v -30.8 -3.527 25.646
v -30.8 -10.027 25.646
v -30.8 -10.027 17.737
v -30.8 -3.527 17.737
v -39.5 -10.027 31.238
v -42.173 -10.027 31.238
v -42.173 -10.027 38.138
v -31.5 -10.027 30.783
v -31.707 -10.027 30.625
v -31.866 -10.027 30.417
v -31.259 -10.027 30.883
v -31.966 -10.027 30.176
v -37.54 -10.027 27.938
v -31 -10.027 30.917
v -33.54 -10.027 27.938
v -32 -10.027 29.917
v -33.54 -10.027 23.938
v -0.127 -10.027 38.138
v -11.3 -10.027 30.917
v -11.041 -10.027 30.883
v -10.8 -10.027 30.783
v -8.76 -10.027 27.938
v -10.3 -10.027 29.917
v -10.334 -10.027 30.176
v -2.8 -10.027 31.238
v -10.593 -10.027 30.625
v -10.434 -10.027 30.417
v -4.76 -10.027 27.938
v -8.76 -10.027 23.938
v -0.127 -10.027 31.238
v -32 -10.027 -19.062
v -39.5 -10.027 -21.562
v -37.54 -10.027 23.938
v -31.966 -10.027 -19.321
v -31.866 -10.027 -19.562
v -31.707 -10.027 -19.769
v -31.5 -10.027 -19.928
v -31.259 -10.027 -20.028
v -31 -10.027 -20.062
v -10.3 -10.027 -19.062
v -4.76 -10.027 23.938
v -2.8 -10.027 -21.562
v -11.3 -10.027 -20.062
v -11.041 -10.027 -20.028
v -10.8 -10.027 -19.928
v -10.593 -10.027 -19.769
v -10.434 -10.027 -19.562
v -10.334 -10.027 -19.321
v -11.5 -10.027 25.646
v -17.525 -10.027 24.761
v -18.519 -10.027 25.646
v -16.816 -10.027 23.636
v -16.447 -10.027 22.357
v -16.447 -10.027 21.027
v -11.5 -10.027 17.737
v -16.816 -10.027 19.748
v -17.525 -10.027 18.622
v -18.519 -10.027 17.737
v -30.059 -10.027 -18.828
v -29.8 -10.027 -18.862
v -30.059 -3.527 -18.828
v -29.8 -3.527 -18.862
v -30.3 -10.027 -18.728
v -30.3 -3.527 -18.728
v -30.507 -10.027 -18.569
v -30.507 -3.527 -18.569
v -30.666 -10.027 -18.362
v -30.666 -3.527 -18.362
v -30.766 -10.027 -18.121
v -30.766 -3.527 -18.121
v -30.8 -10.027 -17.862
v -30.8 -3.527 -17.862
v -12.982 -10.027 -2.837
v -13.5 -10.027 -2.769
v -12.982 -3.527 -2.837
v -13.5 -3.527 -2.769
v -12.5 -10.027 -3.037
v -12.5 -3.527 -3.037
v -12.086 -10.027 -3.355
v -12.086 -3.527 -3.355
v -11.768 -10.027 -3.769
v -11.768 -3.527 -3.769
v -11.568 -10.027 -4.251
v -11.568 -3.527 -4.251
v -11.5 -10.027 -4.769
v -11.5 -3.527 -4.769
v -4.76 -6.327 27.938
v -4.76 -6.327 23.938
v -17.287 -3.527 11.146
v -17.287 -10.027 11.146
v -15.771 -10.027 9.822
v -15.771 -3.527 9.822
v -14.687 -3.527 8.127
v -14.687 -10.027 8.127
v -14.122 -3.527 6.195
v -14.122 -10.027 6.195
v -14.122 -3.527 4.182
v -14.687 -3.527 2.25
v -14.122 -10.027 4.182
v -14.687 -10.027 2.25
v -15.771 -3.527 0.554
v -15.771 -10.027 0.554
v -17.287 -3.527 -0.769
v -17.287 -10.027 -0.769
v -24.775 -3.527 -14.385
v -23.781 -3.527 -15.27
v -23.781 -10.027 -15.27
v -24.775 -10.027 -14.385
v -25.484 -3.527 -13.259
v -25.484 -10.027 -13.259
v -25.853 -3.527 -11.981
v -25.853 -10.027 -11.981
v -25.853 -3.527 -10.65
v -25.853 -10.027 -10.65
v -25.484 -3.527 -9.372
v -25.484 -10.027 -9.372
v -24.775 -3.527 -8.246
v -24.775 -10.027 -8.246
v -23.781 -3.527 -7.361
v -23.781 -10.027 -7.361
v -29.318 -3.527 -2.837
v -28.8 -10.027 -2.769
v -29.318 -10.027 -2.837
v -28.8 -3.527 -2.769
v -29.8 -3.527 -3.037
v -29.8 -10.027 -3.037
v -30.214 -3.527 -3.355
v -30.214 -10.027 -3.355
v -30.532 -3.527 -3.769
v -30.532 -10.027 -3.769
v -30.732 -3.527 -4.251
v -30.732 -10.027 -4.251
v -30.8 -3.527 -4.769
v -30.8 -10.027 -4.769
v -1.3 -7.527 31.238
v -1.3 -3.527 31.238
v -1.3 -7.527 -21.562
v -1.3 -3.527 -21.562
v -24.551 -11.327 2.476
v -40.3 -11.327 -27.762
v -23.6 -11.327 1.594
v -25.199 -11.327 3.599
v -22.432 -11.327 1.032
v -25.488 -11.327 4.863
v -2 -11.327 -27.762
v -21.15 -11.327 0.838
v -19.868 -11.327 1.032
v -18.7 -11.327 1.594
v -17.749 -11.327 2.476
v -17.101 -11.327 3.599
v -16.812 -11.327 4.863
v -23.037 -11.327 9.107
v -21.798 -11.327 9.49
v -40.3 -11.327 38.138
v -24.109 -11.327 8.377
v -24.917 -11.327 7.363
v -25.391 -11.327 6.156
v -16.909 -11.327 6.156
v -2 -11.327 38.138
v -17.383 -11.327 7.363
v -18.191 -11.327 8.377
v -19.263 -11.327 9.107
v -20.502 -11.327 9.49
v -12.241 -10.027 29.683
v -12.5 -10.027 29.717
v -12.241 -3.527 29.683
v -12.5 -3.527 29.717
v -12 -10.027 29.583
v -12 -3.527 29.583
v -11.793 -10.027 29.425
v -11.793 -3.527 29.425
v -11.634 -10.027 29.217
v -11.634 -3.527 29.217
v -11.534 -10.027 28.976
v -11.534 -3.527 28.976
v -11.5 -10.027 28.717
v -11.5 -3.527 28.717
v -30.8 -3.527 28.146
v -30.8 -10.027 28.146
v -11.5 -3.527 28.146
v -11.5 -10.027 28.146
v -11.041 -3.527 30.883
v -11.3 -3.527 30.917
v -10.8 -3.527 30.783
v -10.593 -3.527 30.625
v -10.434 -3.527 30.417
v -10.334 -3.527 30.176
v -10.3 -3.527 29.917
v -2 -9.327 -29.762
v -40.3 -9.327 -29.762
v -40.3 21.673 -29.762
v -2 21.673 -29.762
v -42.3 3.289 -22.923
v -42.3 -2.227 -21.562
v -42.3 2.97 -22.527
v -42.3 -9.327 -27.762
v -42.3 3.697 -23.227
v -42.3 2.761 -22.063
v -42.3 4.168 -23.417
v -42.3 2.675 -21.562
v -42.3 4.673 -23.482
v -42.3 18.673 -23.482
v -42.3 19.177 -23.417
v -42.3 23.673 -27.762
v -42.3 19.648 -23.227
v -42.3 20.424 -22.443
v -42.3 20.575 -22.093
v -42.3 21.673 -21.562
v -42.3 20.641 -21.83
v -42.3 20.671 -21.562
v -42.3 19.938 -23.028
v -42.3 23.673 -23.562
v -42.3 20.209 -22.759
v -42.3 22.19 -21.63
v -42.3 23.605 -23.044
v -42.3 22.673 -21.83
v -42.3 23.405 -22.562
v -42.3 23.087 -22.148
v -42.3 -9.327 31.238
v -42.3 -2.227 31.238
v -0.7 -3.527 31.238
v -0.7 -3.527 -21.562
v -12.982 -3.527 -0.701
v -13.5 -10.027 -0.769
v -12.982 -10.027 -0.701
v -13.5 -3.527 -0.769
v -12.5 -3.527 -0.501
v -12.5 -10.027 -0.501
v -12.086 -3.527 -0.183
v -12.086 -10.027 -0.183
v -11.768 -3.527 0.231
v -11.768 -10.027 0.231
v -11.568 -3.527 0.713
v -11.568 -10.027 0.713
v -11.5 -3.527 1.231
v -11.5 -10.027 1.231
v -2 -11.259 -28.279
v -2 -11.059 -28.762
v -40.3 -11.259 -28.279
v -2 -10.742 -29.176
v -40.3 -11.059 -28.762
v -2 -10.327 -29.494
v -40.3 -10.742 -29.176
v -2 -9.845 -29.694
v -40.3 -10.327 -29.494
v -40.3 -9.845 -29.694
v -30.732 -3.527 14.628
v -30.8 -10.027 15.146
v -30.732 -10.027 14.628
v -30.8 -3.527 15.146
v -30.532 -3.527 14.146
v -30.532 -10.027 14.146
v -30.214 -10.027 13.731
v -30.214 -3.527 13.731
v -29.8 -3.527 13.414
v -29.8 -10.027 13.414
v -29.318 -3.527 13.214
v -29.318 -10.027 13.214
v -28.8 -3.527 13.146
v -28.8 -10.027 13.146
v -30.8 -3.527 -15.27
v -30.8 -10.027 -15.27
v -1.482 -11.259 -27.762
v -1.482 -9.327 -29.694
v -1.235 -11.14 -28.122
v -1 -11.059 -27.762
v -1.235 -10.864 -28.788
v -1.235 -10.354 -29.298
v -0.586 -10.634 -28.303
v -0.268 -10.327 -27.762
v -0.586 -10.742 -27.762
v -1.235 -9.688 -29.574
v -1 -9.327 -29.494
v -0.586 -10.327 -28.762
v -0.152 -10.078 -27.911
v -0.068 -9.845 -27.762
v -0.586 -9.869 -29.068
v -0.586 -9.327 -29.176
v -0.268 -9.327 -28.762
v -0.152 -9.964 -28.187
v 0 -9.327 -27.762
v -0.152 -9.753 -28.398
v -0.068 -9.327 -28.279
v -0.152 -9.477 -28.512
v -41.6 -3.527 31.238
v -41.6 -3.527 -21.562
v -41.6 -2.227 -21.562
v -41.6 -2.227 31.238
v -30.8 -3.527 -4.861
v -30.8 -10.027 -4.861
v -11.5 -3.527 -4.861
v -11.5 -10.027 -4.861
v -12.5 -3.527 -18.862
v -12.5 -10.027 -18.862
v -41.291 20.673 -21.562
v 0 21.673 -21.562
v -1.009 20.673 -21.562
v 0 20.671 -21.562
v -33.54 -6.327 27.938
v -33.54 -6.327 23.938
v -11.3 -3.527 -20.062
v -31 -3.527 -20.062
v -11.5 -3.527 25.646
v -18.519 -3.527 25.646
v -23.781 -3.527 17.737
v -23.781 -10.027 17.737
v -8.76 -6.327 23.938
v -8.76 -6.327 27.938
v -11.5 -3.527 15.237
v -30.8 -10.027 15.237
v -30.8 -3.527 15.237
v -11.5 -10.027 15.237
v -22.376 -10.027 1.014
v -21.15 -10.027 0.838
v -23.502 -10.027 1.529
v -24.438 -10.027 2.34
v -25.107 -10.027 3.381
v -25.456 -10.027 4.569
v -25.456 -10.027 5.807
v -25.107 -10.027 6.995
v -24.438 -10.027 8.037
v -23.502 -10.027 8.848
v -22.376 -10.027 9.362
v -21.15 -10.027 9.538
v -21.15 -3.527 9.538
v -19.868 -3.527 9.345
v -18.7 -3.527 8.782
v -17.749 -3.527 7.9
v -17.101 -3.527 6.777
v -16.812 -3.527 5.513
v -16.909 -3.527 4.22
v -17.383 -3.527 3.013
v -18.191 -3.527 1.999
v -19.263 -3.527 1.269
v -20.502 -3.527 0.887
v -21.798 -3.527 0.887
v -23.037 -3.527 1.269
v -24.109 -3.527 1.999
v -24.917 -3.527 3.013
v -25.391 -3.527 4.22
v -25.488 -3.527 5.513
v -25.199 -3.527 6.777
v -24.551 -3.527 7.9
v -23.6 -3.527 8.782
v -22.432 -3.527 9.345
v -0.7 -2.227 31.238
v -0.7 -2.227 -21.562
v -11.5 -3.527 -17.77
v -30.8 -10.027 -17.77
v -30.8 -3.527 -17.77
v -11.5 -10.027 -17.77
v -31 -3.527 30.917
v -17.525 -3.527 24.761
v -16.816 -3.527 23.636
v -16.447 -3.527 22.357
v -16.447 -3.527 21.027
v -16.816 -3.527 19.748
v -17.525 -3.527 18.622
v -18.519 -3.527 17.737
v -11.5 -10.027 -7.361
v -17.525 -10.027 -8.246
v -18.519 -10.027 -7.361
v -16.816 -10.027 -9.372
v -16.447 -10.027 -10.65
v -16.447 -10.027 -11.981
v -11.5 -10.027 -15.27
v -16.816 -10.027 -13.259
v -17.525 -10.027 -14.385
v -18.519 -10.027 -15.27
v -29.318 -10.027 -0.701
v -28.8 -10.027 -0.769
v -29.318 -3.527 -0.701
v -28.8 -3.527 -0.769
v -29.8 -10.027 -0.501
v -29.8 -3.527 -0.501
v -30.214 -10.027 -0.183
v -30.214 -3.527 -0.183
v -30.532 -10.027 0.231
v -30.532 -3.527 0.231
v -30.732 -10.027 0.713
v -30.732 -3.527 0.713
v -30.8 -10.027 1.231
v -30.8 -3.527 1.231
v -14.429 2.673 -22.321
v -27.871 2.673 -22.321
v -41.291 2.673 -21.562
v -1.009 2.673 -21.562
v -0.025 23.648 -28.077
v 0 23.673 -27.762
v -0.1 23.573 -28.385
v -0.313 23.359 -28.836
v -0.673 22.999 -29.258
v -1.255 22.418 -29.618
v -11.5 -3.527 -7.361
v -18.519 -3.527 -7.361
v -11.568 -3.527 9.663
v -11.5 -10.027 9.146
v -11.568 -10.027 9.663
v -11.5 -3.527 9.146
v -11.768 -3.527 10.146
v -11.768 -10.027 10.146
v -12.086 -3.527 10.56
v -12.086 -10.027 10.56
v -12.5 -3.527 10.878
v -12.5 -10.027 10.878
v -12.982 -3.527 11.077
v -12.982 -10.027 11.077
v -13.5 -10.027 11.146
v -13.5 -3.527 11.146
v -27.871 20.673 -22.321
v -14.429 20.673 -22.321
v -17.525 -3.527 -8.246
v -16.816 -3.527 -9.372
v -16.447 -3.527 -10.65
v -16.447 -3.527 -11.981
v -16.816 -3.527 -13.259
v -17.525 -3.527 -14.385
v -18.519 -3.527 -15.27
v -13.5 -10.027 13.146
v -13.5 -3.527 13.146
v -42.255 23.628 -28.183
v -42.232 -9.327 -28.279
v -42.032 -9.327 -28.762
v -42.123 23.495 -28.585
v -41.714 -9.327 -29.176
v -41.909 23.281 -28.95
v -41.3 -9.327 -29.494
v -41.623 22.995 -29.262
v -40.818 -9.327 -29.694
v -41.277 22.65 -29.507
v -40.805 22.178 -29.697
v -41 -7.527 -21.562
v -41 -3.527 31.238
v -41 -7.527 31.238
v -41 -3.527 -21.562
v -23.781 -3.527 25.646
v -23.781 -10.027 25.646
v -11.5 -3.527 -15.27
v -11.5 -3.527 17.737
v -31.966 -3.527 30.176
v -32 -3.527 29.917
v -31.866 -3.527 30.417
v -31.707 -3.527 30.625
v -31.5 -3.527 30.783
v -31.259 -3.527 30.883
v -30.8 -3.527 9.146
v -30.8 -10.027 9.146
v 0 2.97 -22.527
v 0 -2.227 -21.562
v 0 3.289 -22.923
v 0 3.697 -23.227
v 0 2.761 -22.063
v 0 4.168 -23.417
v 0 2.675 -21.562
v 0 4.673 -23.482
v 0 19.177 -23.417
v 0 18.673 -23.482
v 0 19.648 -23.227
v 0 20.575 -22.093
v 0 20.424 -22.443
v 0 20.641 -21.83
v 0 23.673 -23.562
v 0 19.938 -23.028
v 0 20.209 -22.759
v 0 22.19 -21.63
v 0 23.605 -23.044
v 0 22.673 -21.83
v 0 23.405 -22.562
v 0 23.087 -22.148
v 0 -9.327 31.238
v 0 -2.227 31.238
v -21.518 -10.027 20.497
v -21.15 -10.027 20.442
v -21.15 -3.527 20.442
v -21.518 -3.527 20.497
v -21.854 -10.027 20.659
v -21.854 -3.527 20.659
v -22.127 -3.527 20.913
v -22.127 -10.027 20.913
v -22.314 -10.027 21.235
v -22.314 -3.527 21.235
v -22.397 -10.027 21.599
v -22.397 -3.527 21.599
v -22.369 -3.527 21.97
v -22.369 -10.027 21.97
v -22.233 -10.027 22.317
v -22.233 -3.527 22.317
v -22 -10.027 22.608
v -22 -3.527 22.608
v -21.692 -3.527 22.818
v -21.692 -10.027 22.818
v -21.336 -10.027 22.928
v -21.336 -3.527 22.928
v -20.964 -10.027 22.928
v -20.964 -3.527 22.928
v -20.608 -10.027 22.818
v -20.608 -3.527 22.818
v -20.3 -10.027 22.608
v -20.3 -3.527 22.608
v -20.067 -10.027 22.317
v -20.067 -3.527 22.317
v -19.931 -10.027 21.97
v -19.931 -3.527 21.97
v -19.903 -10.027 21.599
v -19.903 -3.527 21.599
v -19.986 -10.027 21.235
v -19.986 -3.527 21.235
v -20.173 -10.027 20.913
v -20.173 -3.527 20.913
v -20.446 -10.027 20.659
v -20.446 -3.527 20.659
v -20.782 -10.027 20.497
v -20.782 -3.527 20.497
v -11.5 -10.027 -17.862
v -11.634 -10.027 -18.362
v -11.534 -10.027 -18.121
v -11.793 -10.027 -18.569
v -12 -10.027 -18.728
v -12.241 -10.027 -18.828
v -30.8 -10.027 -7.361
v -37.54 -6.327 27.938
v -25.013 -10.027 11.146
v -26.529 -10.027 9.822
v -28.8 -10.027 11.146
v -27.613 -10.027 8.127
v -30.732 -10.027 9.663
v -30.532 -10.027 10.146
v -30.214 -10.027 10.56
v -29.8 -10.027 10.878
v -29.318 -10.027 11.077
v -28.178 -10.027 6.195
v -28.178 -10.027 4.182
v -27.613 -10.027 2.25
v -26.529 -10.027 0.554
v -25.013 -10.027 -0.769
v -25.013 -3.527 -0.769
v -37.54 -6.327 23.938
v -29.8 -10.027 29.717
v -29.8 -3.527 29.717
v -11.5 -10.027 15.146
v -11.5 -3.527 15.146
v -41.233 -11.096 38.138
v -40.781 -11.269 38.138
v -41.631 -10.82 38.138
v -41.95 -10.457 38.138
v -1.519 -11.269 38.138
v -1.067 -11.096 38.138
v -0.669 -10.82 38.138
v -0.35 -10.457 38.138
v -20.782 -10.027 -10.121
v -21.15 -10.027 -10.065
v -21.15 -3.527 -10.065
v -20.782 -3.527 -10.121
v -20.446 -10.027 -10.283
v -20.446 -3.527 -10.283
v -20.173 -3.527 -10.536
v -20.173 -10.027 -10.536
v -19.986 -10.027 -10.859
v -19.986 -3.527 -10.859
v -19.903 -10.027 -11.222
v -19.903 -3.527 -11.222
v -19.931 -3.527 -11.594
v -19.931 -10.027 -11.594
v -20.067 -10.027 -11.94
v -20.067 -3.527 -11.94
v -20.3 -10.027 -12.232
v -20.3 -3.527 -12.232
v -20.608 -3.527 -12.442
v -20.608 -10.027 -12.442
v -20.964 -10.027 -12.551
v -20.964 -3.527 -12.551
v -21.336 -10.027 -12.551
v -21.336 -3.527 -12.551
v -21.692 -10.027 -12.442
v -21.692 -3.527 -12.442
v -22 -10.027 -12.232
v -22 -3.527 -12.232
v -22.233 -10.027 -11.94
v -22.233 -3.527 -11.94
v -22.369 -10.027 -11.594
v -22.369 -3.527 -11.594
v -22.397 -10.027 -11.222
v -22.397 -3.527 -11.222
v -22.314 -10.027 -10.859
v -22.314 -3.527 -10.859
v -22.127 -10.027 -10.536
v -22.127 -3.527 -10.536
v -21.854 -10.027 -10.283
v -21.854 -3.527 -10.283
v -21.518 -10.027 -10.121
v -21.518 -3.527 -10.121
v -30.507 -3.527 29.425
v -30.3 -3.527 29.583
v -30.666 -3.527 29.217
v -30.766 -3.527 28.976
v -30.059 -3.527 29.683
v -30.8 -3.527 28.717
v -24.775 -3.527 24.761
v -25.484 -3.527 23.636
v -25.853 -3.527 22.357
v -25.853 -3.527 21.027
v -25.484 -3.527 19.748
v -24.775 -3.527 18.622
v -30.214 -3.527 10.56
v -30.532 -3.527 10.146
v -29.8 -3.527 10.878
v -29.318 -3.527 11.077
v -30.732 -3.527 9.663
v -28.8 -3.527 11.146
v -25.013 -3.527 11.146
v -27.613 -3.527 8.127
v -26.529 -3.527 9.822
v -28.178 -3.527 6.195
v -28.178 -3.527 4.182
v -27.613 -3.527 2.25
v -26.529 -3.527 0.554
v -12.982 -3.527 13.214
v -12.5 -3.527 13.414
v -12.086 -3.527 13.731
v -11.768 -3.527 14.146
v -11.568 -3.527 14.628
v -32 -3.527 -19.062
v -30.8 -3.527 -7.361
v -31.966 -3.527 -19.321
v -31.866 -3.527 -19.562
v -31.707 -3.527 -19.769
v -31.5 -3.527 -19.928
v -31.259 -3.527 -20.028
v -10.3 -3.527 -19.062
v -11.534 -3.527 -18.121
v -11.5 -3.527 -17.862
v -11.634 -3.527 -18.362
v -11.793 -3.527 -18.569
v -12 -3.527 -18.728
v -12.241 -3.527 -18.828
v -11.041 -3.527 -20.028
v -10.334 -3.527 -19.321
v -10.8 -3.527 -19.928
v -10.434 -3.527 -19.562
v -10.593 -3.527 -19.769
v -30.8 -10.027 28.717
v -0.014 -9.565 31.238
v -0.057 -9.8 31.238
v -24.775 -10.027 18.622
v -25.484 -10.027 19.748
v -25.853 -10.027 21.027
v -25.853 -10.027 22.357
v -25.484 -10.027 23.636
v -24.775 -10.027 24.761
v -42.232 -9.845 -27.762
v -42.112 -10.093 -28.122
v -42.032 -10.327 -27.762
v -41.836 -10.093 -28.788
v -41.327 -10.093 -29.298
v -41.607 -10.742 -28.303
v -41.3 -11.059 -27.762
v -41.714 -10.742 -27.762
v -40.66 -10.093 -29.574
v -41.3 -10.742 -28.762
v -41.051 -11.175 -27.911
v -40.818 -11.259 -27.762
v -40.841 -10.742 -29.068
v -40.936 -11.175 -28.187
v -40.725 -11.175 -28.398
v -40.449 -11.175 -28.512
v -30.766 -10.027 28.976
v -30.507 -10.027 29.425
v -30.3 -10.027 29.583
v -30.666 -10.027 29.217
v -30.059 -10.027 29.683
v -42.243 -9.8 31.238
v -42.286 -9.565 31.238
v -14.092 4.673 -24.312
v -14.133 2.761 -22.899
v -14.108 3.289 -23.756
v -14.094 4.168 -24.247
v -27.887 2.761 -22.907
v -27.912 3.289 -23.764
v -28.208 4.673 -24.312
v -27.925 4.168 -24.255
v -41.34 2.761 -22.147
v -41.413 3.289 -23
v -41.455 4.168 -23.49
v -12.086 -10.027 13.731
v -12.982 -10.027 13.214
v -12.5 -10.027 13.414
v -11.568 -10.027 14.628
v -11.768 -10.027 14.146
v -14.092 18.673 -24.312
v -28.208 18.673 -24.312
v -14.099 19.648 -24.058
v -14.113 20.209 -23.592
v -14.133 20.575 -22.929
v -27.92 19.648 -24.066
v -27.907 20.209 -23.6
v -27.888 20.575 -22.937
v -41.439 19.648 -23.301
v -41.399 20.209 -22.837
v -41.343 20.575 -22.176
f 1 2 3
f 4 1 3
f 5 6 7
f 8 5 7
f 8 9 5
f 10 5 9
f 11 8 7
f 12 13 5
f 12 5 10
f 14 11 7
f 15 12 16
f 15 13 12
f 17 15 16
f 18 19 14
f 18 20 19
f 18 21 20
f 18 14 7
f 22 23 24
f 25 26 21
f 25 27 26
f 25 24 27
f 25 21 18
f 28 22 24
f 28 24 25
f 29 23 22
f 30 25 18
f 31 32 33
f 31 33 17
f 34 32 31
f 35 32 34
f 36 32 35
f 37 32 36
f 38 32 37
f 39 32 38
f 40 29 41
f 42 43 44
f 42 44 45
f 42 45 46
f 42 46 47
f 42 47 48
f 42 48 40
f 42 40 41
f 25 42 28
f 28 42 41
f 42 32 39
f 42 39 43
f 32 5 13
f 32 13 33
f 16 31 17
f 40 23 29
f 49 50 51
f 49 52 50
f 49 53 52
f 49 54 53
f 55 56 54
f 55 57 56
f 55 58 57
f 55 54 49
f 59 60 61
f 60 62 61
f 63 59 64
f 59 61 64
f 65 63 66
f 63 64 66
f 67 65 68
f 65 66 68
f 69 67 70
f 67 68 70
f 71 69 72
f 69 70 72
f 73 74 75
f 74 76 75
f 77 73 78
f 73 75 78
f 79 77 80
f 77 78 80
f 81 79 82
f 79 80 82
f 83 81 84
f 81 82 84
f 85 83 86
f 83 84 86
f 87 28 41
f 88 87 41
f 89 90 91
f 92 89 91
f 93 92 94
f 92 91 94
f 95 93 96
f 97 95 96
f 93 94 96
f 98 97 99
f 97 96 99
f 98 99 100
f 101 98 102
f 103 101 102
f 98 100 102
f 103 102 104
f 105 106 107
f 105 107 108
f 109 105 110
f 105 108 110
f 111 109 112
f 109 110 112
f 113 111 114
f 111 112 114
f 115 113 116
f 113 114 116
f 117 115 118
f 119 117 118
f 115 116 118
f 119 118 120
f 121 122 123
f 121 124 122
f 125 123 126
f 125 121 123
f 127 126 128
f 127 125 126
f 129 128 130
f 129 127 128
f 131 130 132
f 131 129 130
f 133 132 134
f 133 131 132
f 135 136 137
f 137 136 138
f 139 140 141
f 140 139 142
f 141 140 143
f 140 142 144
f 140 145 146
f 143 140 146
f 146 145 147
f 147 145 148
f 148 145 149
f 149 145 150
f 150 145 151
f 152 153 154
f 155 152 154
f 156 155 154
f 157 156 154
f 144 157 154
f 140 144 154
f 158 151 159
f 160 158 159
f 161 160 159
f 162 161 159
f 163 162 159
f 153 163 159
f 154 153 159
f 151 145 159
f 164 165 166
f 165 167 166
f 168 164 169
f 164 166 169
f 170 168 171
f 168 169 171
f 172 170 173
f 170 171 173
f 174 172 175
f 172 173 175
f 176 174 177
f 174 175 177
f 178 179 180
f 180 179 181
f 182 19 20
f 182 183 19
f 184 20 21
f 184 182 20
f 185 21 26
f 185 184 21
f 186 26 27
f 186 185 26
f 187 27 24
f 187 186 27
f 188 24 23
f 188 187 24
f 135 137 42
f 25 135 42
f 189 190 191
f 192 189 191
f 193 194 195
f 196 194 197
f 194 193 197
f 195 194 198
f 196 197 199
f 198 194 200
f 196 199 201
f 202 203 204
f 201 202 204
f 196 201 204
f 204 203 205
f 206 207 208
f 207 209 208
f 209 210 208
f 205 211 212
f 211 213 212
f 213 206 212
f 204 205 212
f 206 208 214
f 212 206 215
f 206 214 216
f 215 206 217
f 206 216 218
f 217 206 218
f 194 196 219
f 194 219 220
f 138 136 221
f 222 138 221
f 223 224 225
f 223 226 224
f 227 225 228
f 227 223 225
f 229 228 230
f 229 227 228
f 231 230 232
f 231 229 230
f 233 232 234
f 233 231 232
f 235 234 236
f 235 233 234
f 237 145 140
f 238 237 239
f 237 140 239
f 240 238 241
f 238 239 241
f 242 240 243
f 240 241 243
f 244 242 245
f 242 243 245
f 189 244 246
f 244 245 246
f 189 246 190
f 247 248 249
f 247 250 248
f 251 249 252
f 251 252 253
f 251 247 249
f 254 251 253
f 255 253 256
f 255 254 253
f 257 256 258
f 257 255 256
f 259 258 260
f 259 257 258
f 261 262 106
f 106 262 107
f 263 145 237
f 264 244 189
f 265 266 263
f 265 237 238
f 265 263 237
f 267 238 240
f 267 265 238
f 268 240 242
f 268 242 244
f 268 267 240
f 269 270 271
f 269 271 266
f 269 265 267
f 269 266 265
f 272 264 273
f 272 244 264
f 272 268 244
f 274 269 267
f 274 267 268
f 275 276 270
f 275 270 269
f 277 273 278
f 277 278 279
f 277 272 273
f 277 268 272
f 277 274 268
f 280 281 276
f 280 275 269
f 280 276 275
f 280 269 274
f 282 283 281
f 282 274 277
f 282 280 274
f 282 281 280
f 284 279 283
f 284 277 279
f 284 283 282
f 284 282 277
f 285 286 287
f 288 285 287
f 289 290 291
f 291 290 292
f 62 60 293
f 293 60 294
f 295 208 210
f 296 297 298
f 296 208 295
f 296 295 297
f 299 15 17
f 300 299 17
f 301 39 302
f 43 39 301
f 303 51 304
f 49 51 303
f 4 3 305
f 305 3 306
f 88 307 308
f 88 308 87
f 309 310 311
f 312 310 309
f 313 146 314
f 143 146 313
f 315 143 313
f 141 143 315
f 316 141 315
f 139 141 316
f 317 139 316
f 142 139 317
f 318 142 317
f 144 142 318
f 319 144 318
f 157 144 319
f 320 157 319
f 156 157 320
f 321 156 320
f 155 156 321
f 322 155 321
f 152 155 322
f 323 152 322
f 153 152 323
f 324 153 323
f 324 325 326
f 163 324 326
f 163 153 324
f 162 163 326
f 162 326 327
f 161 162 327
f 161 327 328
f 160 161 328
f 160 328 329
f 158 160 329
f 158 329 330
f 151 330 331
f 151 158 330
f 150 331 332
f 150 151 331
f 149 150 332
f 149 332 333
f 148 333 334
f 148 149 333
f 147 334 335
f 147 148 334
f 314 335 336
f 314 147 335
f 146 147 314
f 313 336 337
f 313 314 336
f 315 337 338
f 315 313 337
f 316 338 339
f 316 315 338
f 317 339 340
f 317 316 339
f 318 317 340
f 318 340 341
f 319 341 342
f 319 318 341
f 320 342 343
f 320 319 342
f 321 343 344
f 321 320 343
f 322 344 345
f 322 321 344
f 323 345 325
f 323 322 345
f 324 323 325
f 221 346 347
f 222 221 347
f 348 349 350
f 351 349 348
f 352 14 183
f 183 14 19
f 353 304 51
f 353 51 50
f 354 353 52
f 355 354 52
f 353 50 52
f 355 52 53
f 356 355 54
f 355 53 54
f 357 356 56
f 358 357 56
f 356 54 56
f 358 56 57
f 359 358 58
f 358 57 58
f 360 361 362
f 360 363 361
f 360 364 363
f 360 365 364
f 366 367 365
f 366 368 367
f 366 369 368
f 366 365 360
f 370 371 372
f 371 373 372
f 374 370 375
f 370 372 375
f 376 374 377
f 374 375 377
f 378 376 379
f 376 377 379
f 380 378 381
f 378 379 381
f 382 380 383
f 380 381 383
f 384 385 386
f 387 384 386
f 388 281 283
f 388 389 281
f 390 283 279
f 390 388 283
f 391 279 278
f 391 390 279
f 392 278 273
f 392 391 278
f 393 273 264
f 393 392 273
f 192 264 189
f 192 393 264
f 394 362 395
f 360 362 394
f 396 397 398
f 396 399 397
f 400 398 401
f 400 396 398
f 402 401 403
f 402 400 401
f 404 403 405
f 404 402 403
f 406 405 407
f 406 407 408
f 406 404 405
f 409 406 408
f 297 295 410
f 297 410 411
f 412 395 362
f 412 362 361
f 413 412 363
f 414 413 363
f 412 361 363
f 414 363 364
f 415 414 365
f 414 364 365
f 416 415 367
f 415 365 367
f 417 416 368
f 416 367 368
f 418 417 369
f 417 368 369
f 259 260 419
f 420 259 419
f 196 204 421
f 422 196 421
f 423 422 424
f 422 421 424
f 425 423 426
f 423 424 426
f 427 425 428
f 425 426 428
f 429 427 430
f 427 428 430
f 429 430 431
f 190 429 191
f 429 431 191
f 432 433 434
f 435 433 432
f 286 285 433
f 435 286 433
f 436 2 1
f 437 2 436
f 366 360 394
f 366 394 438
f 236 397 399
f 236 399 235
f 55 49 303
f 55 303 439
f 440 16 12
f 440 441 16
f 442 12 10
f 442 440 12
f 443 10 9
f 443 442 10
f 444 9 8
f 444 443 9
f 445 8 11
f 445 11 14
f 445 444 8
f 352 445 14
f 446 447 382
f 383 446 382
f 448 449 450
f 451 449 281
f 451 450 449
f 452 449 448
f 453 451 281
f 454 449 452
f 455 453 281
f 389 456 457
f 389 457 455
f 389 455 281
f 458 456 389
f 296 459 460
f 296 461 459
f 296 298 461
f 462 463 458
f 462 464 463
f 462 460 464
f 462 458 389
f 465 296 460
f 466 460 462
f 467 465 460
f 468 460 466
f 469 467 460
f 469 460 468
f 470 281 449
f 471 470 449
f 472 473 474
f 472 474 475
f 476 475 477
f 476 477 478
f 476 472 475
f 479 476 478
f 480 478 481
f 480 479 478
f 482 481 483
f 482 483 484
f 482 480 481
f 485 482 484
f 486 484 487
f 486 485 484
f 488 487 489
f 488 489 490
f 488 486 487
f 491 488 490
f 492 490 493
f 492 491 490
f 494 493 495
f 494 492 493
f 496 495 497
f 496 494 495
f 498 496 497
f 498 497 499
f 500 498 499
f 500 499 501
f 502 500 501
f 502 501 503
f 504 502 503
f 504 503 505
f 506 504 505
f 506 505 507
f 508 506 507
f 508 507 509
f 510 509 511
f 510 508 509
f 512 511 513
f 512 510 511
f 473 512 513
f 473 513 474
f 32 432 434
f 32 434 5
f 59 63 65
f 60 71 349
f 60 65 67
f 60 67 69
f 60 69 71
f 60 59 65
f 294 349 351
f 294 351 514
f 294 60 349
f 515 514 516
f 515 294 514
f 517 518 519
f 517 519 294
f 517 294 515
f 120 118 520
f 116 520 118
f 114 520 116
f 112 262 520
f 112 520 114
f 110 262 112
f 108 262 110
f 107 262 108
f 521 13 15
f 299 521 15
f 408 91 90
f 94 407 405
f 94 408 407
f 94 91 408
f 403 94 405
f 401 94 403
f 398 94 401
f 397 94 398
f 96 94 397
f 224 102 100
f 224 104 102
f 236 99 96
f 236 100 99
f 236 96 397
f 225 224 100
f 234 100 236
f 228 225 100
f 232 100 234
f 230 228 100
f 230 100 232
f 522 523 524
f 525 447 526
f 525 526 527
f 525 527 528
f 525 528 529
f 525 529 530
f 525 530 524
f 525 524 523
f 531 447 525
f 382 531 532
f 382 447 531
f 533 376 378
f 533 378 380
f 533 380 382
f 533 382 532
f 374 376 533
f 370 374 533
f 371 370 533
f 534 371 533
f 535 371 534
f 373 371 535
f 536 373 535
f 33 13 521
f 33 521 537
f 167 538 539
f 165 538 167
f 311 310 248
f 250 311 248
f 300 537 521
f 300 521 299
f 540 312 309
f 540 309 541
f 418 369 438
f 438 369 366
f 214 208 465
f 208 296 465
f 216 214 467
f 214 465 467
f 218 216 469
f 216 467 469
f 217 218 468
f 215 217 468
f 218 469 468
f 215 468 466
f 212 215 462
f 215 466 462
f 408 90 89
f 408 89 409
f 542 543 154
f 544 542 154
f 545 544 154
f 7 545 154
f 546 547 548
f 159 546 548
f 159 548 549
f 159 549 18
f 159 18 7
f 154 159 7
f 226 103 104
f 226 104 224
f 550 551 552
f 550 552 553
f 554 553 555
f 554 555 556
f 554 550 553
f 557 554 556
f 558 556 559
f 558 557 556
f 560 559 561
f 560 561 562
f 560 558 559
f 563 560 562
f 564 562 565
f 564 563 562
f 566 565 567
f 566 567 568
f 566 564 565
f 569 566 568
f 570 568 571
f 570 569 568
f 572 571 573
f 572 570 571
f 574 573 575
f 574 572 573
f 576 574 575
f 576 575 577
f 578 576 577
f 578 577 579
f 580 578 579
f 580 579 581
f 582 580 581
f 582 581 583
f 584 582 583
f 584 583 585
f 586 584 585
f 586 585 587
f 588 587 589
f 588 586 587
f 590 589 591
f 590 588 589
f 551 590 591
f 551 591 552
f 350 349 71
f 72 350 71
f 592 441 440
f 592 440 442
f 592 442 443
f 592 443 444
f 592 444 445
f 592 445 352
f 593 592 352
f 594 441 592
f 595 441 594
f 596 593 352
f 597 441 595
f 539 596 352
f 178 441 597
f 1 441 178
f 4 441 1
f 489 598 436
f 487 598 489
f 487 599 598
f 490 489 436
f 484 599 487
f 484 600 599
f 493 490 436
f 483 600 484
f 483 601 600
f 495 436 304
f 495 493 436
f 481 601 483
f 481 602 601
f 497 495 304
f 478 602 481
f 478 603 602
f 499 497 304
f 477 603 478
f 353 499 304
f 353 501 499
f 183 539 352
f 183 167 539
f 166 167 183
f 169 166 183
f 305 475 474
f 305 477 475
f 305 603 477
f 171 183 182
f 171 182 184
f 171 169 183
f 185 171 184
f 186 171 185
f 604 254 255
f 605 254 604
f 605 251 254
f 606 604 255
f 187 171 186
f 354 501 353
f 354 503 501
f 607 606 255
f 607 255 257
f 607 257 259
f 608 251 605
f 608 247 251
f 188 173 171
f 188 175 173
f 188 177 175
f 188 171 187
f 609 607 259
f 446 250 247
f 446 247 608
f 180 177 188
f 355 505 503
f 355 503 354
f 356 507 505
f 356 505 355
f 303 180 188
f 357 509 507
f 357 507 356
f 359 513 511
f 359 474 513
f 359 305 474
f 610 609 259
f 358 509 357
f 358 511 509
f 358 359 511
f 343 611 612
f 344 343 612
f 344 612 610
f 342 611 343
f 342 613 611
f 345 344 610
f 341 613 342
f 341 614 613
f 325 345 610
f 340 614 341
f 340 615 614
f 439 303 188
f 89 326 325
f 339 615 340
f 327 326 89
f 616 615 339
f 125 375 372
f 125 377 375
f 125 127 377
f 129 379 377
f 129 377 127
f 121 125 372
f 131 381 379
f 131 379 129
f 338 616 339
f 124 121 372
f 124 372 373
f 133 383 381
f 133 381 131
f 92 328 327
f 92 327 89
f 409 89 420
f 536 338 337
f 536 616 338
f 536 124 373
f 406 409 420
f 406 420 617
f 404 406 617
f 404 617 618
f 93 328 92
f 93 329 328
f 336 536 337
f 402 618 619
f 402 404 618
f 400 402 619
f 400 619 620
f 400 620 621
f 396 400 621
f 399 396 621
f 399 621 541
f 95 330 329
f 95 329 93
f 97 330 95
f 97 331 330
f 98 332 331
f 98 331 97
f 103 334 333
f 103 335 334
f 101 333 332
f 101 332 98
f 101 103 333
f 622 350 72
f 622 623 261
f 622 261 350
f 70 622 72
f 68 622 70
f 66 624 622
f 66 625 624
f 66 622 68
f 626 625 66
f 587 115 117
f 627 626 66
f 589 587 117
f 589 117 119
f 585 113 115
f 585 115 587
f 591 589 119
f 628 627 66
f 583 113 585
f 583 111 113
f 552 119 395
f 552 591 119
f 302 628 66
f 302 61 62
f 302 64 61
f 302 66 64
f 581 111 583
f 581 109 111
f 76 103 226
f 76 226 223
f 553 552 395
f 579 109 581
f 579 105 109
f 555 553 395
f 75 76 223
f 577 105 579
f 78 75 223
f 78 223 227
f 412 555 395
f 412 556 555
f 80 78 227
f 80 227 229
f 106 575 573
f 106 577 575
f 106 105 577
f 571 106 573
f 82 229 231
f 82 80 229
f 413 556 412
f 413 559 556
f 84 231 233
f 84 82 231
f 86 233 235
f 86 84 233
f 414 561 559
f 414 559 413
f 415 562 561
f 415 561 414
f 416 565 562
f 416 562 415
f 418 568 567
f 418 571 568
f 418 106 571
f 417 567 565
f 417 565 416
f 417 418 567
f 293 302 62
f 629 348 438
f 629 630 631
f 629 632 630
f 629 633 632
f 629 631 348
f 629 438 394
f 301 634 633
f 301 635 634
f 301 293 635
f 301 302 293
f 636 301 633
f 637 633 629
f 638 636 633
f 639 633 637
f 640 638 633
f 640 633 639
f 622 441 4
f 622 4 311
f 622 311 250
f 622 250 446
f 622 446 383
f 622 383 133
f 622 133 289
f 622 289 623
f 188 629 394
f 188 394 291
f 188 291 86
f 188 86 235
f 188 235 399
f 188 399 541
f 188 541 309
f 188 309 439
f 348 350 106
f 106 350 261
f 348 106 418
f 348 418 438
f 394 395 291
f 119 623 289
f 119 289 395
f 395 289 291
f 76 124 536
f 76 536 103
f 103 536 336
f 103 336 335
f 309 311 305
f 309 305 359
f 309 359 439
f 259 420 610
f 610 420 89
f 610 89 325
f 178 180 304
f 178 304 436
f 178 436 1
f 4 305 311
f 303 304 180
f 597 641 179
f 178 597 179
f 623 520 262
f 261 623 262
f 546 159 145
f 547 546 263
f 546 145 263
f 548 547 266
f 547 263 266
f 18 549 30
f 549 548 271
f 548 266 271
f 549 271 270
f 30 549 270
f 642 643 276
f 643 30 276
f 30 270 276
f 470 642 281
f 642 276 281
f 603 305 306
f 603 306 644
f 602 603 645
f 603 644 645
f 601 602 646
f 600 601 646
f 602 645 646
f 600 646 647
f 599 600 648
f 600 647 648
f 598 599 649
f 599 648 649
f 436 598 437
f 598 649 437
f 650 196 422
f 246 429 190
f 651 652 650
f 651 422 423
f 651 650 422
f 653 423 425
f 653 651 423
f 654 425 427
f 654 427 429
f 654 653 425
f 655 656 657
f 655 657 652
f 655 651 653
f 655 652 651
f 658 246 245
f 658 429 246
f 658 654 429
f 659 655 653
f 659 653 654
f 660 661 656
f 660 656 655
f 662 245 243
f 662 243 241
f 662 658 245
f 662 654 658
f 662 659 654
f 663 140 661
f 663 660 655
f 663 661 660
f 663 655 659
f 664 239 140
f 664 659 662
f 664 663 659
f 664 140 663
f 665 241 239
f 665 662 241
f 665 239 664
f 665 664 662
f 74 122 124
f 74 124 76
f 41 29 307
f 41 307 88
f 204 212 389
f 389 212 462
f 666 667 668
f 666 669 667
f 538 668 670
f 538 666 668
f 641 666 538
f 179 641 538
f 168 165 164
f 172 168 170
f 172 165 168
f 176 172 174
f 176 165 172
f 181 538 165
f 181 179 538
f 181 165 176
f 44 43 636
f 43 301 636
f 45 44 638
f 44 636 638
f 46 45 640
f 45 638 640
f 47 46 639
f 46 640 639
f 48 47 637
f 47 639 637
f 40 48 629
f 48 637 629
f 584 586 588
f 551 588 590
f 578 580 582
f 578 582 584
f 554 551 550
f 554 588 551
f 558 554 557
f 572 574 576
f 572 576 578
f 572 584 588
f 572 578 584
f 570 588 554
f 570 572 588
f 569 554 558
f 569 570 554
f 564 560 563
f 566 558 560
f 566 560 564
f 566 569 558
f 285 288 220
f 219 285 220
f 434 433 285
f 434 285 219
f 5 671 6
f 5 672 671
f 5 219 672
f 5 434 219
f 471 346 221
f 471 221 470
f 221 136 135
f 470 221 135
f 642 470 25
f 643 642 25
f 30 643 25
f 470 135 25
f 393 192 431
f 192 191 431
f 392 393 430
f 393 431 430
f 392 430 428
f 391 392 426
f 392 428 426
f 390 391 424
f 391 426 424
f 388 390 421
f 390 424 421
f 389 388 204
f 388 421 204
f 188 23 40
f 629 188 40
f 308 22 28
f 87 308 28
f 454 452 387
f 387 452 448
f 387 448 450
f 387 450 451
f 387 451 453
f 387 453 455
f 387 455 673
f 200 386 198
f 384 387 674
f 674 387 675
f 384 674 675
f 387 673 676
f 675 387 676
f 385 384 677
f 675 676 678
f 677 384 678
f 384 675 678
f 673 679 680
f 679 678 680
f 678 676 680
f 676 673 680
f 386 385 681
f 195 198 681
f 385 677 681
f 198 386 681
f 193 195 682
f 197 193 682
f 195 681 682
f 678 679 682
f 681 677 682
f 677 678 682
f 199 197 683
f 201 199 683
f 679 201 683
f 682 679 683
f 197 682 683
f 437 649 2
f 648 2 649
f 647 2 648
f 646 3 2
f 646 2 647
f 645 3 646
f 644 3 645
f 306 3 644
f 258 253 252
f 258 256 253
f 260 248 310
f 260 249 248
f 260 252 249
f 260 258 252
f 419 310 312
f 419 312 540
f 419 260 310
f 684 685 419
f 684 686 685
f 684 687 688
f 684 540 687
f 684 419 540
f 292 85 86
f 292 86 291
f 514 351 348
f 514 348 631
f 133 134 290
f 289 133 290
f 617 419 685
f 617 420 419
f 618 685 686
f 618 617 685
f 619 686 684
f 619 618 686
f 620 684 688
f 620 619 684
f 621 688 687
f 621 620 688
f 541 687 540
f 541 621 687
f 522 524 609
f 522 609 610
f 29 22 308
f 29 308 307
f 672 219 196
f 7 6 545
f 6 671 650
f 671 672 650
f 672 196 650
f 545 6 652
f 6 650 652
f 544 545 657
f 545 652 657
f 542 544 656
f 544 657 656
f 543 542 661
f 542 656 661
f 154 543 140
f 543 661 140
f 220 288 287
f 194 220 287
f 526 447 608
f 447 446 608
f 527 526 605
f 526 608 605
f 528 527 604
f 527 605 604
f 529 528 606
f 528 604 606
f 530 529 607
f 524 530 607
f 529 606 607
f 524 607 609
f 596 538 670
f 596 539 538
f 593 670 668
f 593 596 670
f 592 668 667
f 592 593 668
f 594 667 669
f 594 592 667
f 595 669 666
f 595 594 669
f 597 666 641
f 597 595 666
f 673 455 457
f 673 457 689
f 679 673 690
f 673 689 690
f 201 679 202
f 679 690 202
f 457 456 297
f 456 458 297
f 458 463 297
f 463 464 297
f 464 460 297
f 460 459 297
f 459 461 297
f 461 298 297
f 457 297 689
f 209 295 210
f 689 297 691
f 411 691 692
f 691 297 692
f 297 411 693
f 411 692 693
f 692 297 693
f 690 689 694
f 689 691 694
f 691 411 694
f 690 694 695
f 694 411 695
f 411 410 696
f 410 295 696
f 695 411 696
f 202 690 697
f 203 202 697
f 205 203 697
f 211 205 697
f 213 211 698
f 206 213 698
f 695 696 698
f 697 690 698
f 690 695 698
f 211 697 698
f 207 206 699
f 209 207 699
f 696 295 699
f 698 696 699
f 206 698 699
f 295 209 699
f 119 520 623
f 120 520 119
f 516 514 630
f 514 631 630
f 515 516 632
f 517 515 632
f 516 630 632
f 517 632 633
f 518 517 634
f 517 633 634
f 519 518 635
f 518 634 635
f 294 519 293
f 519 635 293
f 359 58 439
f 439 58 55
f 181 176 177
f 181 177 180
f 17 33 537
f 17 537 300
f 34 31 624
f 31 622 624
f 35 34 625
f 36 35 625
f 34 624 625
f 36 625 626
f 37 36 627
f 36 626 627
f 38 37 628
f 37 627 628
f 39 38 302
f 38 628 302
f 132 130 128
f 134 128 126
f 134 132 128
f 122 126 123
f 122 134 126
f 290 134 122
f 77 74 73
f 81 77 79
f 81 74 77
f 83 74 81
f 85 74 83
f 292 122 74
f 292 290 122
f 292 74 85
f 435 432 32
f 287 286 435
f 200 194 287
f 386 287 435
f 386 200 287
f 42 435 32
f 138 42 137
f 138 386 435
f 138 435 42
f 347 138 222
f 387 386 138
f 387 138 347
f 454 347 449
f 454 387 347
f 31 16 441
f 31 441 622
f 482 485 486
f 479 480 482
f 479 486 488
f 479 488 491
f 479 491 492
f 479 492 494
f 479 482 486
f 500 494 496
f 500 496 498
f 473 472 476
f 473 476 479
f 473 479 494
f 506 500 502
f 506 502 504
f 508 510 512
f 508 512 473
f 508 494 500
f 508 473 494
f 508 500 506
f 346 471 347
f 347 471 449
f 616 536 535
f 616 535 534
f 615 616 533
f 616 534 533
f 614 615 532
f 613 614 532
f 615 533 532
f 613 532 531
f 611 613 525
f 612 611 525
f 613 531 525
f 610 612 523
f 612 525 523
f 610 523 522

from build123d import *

# Parameters (mm, degrees)
SALIENTE_EXTRUIR1_DEPTH  = 42.3
CROQUIS3_W               = 40.9
CROQUIS3_H               = 56.9
CORTAR_EXTRUIR1_DEPTH    = 1.3
CROQUIS5_W               = 42.3
CROQUIS5_H               = 2.8
CORTAR_EXTRUIR2_DEPTH    = 7.8
CROQUIS6_W               = 40.9
CROQUIS6_H               = 26.5
CORTAR_EXTRUIR3_DEPTH    = 1.3
CROQUIS8_W               = 39.7
CROQUIS8_H               = 56.9
CORTAR_EXTRUIR4_DEPTH    = 6.5
CROQUIS9_W               = 39.7
CROQUIS9_H               = 32.2
CORTAR_EXTRUIR5_DEPTH    = 7.3
CROQUIS10_W              = 21.7
CROQUIS10_H              = 50.979199381
CROQUIS10_W_2            = 19.3
CROQUIS10_H_2            = 48.579199381
SALIENTE_EXTRUIR2_DEPTH  = 6.5
REDONDEO6_R              = 1
REDONDEO7_R              = 1
CROQUIS17_W              = 39.7
CROQUIS17_H              = 32.2
SALIENTE_EXTRUIR4_DEPTH  = 6
SALIENTE_EXTRUIR5_DEPTH  = 1.3
CORTAR_EXTRUIR6_DEPTH    = 21
REDONDEO8_R              = 2
REDONDEO10_R             = 2
CROQUIS26_R              = 7.1
CROQUIS26_R_2            = 4.35
SALIENTE_EXTRUIR7_DEPTH  = 6.5
CORTAR_EXTRUIR7_START    = -44
CROQUIS27_R              = 4.35
CORTAR_EXTRUIR7_DEPTH    = 44
CROQUIS28_W              = 19.3
CROQUIS28_H              = 2
SALIENTE_EXTRUIR8_DEPTH  = 6.5
REDONDEO11_R             = 2
REDONDEO12_R             = 2
CROQUIS30_R              = 4.75
CROQUIS30_R_2            = 1.25
SALIENTE_EXTRUIR9_DEPTH  = 6.5
CROQUIS33_W              = 19.3
CROQUIS33_H              = 2.5
SALIENTE_EXTRUIR11_DEPTH = 6.5
CORTAR_EXTRUIR8_DEPTH    = 4.1
CROQUIS23_W              = 4
CROQUIS23_H              = 4
SALIENTE_EXTRUIR12_DEPTH = 3.7
NERVIO5_REACH            = 61.555
CROQUIS39_WALL_W         = 124.026264302
CROQUIS39_WALL_H         = 52.8
NERVIO7_REACH            = 61.555
CROQUIS43_WALL_W         = 124.026264302
CROQUIS43_WALL_H         = 52.8
CROQUIS44_W              = 42.3
CROQUIS44_H              = 3
SALIENTE_EXTRUIR13_DEPTH = 4.7
REDONDEO13_R             = 2
REDONDEO14_R             = 2


with BuildPart() as part:
    # Croquis1 → Saliente-Extruir1 (new body)
    with BuildSketch(Plane(origin=(0, 0, 0), x_dir=(0, 0, -1), z_dir=(1, 0, 0))):
        Polygon((-38.13826087, -2.227336957), (21.56173913, -2.227336957), (21.56173913, 23.672663043), (29.76173913, 23.672663043), (29.76173913, -2.261684783), (29.76173913, -11.327336957), (-38.13826087, -11.327336957), align=None)
    extrude(amount=-SALIENTE_EXTRUIR1_DEPTH)

    # Croquis3 → Cortar-Extruir1 (cut)
    with BuildSketch(Plane(origin=(0, -2.227336957, 0), x_dir=(1, 0, 0), z_dir=(0, 1, 0))):
        with Locations((-21.15, -6.88826087)):
            Rectangle(CROQUIS3_W, CROQUIS3_H)
    extrude(amount=-CORTAR_EXTRUIR1_DEPTH, mode=Mode.SUBTRACT)

    # Croquis5 → Cortar-Extruir2 (cut)
    with BuildSketch(Plane(origin=(0, -2.227336957, 0), x_dir=(1, 0, 0), z_dir=(0, 1, 0))):
        with Locations((-21.15, -36.73826087)):
            Rectangle(CROQUIS5_W, CROQUIS5_H)
    extrude(amount=-CORTAR_EXTRUIR2_DEPTH, mode=Mode.SUBTRACT)

    # Croquis6 → Cortar-Extruir3 (cut)
    with BuildSketch(Plane.XY.offset(-21.56173913)):
        with Locations((-21.15, 9.722663043)):
            Rectangle(CROQUIS6_W, CROQUIS6_H)
    extrude(amount=-CORTAR_EXTRUIR3_DEPTH, mode=Mode.SUBTRACT)

    # Croquis8 → Cortar-Extruir4 (cut)
    with BuildSketch(Plane(origin=(0, -3.527336957, 0), x_dir=(1, 0, 0), z_dir=(0, 1, 0))):
        with Locations((-21.15, -6.88826087)):
            Rectangle(CROQUIS8_W, CROQUIS8_H)
    extrude(amount=-CORTAR_EXTRUIR4_DEPTH, mode=Mode.SUBTRACT)

    # Croquis9 → Cortar-Extruir5 (cut)
    with BuildSketch(Plane.XY.offset(-21.56173913)):
        with Locations((-21.15, 6.072663043)):
            Rectangle(CROQUIS9_W, CROQUIS9_H)
    extrude(amount=-CORTAR_EXTRUIR5_DEPTH, mode=Mode.SUBTRACT)

    # Croquis10 → Saliente-Extruir2 (add)
    with BuildSketch(Plane(origin=(0, -10.027336957, 0), x_dir=(1, 0, 0), z_dir=(0, 1, 0))):
        with Locations((-21.15, -5.42786056)):
            Rectangle(CROQUIS10_W, CROQUIS10_H)
        with Locations((-21.15, -5.427860561)):
            Rectangle(CROQUIS10_W_2, CROQUIS10_H_2, mode=Mode.SUBTRACT)
    extrude(amount=SALIENTE_EXTRUIR2_DEPTH)

    # Redondeo6
    redondeo6_edges = [part.edges().sort_by_distance(p)[0] for p in [
        (-30.8, -6.777336957, -18.86173913),
        (-11.5, -6.777336957, -18.86173913),
        (-11.5, -6.777336957, 29.717460251),
        (-30.8, -6.777336957, 29.717460251),
    ]]
    fillet(redondeo6_edges, radius=REDONDEO6_R)

    # Redondeo7
    redondeo7_edges = [part.edges().sort_by_distance(p)[0] for p in [
        (-10.3, -6.777336957, -20.06173913),
        (-10.3, -6.777336957, 30.917460251),
        (-32, -6.777336957, 30.917460251),
        (-32, -6.777336957, -20.06173913),
    ]]
    fillet(redondeo7_edges, radius=REDONDEO7_R)

    # Croquis17 → Saliente-Extruir4 (add)
    with BuildSketch(Plane.XY.offset(-28.86173913)):
        with Locations((-21.15, 6.072663043)):
            Rectangle(CROQUIS17_W, CROQUIS17_H)
    extrude(amount=SALIENTE_EXTRUIR4_DEPTH)

    # Croquis18 → Saliente-Extruir5 (add)
    with BuildSketch(Plane.XY.offset(-22.86173913)):
        Polygon((-41.6, 22.972663043), (-41.6, -3.527336957), (-41, -3.527336957), (-41, -10.027336957), (-1.3, -10.027336957), (-1.3, -3.527336957), (-0.7, -3.527336957), (-0.7, 22.972663043), align=None)
    extrude(amount=SALIENTE_EXTRUIR5_DEPTH)

    # Croquis19 → Cortar-Extruir6 (cut)
    with BuildSketch(Plane(origin=(0, 23.672663043, 0), x_dir=(1, 0, 0), z_dir=(0, 1, 0))):
        with BuildLine():
            Line((-42.3, 23.48173913), (-42.3, 21.56173913))
            Line((-42.3, 21.56173913), (0, 21.56173913))
            Line((0, 21.56173913), (0, 23.48173913))
            ThreePointArc((0, 23.48173913), (-21.15, 24.415477395), (-42.3, 23.48173913))
        make_face()
    extrude(amount=-CORTAR_EXTRUIR6_DEPTH, mode=Mode.SUBTRACT)

    # Redondeo8
    redondeo8_edges = [part.edges().sort_by_distance(p)[0] for p in [
        (-42.3, 6.172663043, -29.76173913),
        (-21.15, 23.672663043, -29.76173913),
        (-21.15, -11.327336957, -29.76173913),
        (0, 6.172663043, -29.76173913),
    ]]
    fillet(redondeo8_edges, radius=REDONDEO8_R)

    # Redondeo10
    # the kernel refuses this fillet: 2 mm, written as the material it takes off along each edge
    with BuildSketch(Plane(origin=(-40.3, -9.327336957, -27.76173913), x_dir=(-1, 0, 0), z_dir=(0, -1, 0))) as redondeo10_piece_1_section:
        Polygon((0, 0), (REDONDEO10_R, 0), (REDONDEO10_R, REDONDEO10_R), (0, REDONDEO10_R), align=None)
    redondeo10_piece_1 = extrude(amount=REDONDEO10_R, mode=Mode.PRIVATE)
    redondeo10_piece_1 = redondeo10_piece_1 - Plane(origin=(-40.3, -9.327336957, -27.76173913), x_dir=(0.7071067811865475, 0, 0.7071067811865475), z_dir=(0, -1, 0)) * Sphere(REDONDEO10_R, mode=Mode.PRIVATE)
    add(redondeo10_piece_1, mode=Mode.SUBTRACT)
    with BuildSketch(Plane(origin=(-2, -9.327336957, -27.76173913), x_dir=(0, -1, 0), z_dir=(1, 0, 0))) as redondeo10_piece_2_section:
        Polygon((0, 0), (REDONDEO10_R, 0), (REDONDEO10_R, REDONDEO10_R), (0, REDONDEO10_R), align=None)
    redondeo10_piece_2 = extrude(amount=REDONDEO10_R, mode=Mode.PRIVATE)
    redondeo10_piece_2 = redondeo10_piece_2 - Plane(origin=(-2, -9.327336957, -27.76173913), x_dir=(0, 0.7071067811865475, 0.7071067811865475), z_dir=(1, 0, 0)) * Sphere(REDONDEO10_R, mode=Mode.PRIVATE)
    add(redondeo10_piece_2, mode=Mode.SUBTRACT)
    with BuildSketch(Plane(origin=(-42.3, -11.327336957, -27.76173913), x_dir=(1, 0, 0), z_dir=(0, 0, 1)), Plane(origin=(0, -11.327336957, -27.76173913), x_dir=(0, 1, 0), z_dir=(0, 0, 1))) as redondeo10_piece_3:
        with BuildLine():
            CenterArc((REDONDEO10_R, REDONDEO10_R), REDONDEO10_R, 180, 90)
            Line((0, REDONDEO10_R), (0, 0))
            Line((0, 0), (REDONDEO10_R, 0))
        make_face()
    extrude(amount=70.9, mode=Mode.SUBTRACT)

    # Croquis26 → Saliente-Extruir7 (add)
    with BuildSketch(Plane(origin=(0, -10.027336957, 0), x_dir=(1, 0, 0), z_dir=(0, 1, 0))):
        with Locations(Location((-21.15, -5.18826087, 0), (0, 0, 90))):
            Circle(CROQUIS26_R)
        with Locations(Location((-21.15, -5.18826087, 0), (0, 0, 270))):
            Circle(CROQUIS26_R_2, mode=Mode.SUBTRACT)
    extrude(amount=SALIENTE_EXTRUIR7_DEPTH)

    # Croquis27 → Cortar-Extruir7 (cut)
    with BuildSketch(Plane(origin=(0, -10.027336957, 0), x_dir=(1, 0, 0), z_dir=(0, 1, 0)).offset(CORTAR_EXTRUIR7_START)):
        with Locations(Location((-21.15, -5.18826087, 0), (0, 0, 90))):
            Circle(CROQUIS27_R)
    extrude(amount=CORTAR_EXTRUIR7_DEPTH, mode=Mode.SUBTRACT)

    # Croquis28 → Saliente-Extruir8 (add)
    with BuildSketch(Plane(origin=(0, -10.027336957, 0), x_dir=(1, 0, 0), z_dir=(0, 1, 0))):
        with Locations((-21.15, 1.769114844)):
            Rectangle(CROQUIS28_W, CROQUIS28_H)
        with Locations((-21.15, -12.145636583)):
            Rectangle(CROQUIS28_W, CROQUIS28_H)
    extrude(amount=SALIENTE_EXTRUIR8_DEPTH)

    # Redondeo11
    redondeo11_edges = [part.edges().sort_by_distance(p)[0] for p in [
        (-30.8, -6.777336957, -0.769114844),
        (-11.5, -6.777336957, -0.769114844),
        (-11.5, -6.777336957, 11.145636583),
        (-30.8, -6.777336957, 11.145636583),
    ]]
    fillet(redondeo11_edges, radius=REDONDEO11_R)

    # Redondeo12
    redondeo12_edges = [part.edges().sort_by_distance(p)[0] for p in [
        (-30.8, -6.777336957, -2.769114844),
        (-11.5, -6.777336957, -2.769114844),
        (-30.8, -6.777336957, 13.145636583),
        (-11.5, -6.777336957, 13.145636583),
    ]]
    fillet(redondeo12_edges, radius=REDONDEO12_R)

    # Croquis30 → Saliente-Extruir9 (add)
    # profile 1 of 2: a face of its own
    with BuildSketch(Plane(origin=(0, -10.027336957, 0), x_dir=(1, 0, 0), z_dir=(0, 1, 0))):
        with Locations(Location((-21.15, 11.315426987, 0), (0, 0, 90))):
            Circle(CROQUIS30_R)
        with Locations(Location((-21.15, 11.315426987, 0), (0, 0, 270))):
            Circle(CROQUIS30_R_2, mode=Mode.SUBTRACT)
    # profile 2 of 2: a face of its own
    with BuildSketch(Plane(origin=(0, -10.027336957, 0), x_dir=(1, 0, 0), z_dir=(0, 1, 0))):
        with Locations(Location((-21.15, -21.691948726, 0), (0, 0, 90))):
            Circle(CROQUIS30_R)
        with Locations(Location((-21.15, -21.691948726, 0), (0, 0, 90))):
            Circle(CROQUIS30_R_2, mode=Mode.SUBTRACT)
    extrude(amount=SALIENTE_EXTRUIR9_DEPTH)

    # Croquis33 → Saliente-Extruir11 (add)
    with BuildSketch(Plane(origin=(0, -10.027336957, 0), x_dir=(1, 0, 0), z_dir=(0, 1, 0))):
        with Locations((-21.15, 16.519944868)):
            Rectangle(CROQUIS33_W, CROQUIS33_H)
        with Locations((-21.15, 6.110909106)):
            Rectangle(CROQUIS33_W, CROQUIS33_H)
        with Locations((-21.15, -16.487430845)):
            Rectangle(CROQUIS33_W, CROQUIS33_H)
        with Locations((-21.15, -26.896466607)):
            Rectangle(CROQUIS33_W, CROQUIS33_H)
    extrude(amount=SALIENTE_EXTRUIR11_DEPTH)

    # Croquis34 → Cortar-Extruir8 (cut)
    with BuildSketch(Plane.XY.offset(35.33826087)):
        Polygon((-1.3, -10.027336957), (-1.3, -3.527336957), (-0.7, -3.527336957), (-0.7, -2.227336957), (0, -2.227336957), (0, -10.027336957), align=None)
        Polygon((-42.3, -2.227336957), (-42.3, -10.027336957), (-41, -10.027336957), (-41, -3.527336957), (-41.6, -3.527336957), (-41.6, -2.227336957), align=None)
    extrude(amount=-CORTAR_EXTRUIR8_DEPTH, mode=Mode.SUBTRACT)

    # Croquis23 → Saliente-Extruir12 (add)
    with BuildSketch(Plane(origin=(0, -10.027336957, 0), x_dir=(1, 0, 0), z_dir=(0, 1, 0))):
        with Locations((-6.76, -25.93826087)):
            Rectangle(CROQUIS23_W, CROQUIS23_H)
        with Locations((-35.54, -25.93826087)):
            Rectangle(CROQUIS23_W, CROQUIS23_H)
    extrude(amount=SALIENTE_EXTRUIR12_DEPTH)

    # Croquis39 wall → Nervio5 (add, up to next)
    with BuildSketch(Plane(origin=(-40.25, -8.777336957, 4.83826087), x_dir=(0.514495755428, -0.857492925713, 0), z_dir=(0.857492925713, 0.514495755428, 0)), mode=Mode.PRIVATE) as nervio5_sk1:
        Rectangle(CROQUIS39_WALL_W, CROQUIS39_WALL_H)
    nervio5_tool1 = extrude(nervio5_sk1.sketch, amount=-NERVIO5_REACH, mode=Mode.PRIVATE) - part.part
    add(nervio5_tool1.solids().sort_by_distance((-40.25, -8.777336957, 4.83826087))[0])

    # Croquis43 wall → Nervio7 (add, up to next)
    with BuildSketch(Plane(origin=(-2.05, -8.777336957, 4.83826087), x_dir=(-0.514495755428, -0.857492925713, 0), z_dir=(0.857492925713, -0.514495755428, 0)), mode=Mode.PRIVATE) as nervio7_sk1:
        Rectangle(CROQUIS43_WALL_W, CROQUIS43_WALL_H)
    nervio7_tool1 = extrude(nervio7_sk1.sketch, amount=NERVIO7_REACH, mode=Mode.PRIVATE) - part.part
    add(nervio7_tool1.solids().sort_by_distance((-2.05, -8.777336957, 4.83826087))[0])

    # Croquis44 → Saliente-Extruir13 (add)
    with BuildSketch(Plane.XY.offset(-21.56173913)):
        with Locations((-21.15, 22.172663043)):
            Rectangle(CROQUIS44_W, CROQUIS44_H)
    extrude(amount=-SALIENTE_EXTRUIR13_DEPTH)

    # Redondeo13
    redondeo13_edges = [part.edges().sort_by_distance(p)[0] for p in [
        (-21.15, 2.672663043, -24.415477395),
        (-21.15, 20.672663043, -24.415477395),
    ]]
    fillet(redondeo13_edges, radius=REDONDEO13_R)

    # Redondeo14
    redondeo14_edges = [part.edges().sort_by_distance(p)[0] for p in [
        (-21.15, 23.672663043, -21.56173913),
    ]]
    fillet(redondeo14_edges, radius=REDONDEO14_R)


solid = part.part
